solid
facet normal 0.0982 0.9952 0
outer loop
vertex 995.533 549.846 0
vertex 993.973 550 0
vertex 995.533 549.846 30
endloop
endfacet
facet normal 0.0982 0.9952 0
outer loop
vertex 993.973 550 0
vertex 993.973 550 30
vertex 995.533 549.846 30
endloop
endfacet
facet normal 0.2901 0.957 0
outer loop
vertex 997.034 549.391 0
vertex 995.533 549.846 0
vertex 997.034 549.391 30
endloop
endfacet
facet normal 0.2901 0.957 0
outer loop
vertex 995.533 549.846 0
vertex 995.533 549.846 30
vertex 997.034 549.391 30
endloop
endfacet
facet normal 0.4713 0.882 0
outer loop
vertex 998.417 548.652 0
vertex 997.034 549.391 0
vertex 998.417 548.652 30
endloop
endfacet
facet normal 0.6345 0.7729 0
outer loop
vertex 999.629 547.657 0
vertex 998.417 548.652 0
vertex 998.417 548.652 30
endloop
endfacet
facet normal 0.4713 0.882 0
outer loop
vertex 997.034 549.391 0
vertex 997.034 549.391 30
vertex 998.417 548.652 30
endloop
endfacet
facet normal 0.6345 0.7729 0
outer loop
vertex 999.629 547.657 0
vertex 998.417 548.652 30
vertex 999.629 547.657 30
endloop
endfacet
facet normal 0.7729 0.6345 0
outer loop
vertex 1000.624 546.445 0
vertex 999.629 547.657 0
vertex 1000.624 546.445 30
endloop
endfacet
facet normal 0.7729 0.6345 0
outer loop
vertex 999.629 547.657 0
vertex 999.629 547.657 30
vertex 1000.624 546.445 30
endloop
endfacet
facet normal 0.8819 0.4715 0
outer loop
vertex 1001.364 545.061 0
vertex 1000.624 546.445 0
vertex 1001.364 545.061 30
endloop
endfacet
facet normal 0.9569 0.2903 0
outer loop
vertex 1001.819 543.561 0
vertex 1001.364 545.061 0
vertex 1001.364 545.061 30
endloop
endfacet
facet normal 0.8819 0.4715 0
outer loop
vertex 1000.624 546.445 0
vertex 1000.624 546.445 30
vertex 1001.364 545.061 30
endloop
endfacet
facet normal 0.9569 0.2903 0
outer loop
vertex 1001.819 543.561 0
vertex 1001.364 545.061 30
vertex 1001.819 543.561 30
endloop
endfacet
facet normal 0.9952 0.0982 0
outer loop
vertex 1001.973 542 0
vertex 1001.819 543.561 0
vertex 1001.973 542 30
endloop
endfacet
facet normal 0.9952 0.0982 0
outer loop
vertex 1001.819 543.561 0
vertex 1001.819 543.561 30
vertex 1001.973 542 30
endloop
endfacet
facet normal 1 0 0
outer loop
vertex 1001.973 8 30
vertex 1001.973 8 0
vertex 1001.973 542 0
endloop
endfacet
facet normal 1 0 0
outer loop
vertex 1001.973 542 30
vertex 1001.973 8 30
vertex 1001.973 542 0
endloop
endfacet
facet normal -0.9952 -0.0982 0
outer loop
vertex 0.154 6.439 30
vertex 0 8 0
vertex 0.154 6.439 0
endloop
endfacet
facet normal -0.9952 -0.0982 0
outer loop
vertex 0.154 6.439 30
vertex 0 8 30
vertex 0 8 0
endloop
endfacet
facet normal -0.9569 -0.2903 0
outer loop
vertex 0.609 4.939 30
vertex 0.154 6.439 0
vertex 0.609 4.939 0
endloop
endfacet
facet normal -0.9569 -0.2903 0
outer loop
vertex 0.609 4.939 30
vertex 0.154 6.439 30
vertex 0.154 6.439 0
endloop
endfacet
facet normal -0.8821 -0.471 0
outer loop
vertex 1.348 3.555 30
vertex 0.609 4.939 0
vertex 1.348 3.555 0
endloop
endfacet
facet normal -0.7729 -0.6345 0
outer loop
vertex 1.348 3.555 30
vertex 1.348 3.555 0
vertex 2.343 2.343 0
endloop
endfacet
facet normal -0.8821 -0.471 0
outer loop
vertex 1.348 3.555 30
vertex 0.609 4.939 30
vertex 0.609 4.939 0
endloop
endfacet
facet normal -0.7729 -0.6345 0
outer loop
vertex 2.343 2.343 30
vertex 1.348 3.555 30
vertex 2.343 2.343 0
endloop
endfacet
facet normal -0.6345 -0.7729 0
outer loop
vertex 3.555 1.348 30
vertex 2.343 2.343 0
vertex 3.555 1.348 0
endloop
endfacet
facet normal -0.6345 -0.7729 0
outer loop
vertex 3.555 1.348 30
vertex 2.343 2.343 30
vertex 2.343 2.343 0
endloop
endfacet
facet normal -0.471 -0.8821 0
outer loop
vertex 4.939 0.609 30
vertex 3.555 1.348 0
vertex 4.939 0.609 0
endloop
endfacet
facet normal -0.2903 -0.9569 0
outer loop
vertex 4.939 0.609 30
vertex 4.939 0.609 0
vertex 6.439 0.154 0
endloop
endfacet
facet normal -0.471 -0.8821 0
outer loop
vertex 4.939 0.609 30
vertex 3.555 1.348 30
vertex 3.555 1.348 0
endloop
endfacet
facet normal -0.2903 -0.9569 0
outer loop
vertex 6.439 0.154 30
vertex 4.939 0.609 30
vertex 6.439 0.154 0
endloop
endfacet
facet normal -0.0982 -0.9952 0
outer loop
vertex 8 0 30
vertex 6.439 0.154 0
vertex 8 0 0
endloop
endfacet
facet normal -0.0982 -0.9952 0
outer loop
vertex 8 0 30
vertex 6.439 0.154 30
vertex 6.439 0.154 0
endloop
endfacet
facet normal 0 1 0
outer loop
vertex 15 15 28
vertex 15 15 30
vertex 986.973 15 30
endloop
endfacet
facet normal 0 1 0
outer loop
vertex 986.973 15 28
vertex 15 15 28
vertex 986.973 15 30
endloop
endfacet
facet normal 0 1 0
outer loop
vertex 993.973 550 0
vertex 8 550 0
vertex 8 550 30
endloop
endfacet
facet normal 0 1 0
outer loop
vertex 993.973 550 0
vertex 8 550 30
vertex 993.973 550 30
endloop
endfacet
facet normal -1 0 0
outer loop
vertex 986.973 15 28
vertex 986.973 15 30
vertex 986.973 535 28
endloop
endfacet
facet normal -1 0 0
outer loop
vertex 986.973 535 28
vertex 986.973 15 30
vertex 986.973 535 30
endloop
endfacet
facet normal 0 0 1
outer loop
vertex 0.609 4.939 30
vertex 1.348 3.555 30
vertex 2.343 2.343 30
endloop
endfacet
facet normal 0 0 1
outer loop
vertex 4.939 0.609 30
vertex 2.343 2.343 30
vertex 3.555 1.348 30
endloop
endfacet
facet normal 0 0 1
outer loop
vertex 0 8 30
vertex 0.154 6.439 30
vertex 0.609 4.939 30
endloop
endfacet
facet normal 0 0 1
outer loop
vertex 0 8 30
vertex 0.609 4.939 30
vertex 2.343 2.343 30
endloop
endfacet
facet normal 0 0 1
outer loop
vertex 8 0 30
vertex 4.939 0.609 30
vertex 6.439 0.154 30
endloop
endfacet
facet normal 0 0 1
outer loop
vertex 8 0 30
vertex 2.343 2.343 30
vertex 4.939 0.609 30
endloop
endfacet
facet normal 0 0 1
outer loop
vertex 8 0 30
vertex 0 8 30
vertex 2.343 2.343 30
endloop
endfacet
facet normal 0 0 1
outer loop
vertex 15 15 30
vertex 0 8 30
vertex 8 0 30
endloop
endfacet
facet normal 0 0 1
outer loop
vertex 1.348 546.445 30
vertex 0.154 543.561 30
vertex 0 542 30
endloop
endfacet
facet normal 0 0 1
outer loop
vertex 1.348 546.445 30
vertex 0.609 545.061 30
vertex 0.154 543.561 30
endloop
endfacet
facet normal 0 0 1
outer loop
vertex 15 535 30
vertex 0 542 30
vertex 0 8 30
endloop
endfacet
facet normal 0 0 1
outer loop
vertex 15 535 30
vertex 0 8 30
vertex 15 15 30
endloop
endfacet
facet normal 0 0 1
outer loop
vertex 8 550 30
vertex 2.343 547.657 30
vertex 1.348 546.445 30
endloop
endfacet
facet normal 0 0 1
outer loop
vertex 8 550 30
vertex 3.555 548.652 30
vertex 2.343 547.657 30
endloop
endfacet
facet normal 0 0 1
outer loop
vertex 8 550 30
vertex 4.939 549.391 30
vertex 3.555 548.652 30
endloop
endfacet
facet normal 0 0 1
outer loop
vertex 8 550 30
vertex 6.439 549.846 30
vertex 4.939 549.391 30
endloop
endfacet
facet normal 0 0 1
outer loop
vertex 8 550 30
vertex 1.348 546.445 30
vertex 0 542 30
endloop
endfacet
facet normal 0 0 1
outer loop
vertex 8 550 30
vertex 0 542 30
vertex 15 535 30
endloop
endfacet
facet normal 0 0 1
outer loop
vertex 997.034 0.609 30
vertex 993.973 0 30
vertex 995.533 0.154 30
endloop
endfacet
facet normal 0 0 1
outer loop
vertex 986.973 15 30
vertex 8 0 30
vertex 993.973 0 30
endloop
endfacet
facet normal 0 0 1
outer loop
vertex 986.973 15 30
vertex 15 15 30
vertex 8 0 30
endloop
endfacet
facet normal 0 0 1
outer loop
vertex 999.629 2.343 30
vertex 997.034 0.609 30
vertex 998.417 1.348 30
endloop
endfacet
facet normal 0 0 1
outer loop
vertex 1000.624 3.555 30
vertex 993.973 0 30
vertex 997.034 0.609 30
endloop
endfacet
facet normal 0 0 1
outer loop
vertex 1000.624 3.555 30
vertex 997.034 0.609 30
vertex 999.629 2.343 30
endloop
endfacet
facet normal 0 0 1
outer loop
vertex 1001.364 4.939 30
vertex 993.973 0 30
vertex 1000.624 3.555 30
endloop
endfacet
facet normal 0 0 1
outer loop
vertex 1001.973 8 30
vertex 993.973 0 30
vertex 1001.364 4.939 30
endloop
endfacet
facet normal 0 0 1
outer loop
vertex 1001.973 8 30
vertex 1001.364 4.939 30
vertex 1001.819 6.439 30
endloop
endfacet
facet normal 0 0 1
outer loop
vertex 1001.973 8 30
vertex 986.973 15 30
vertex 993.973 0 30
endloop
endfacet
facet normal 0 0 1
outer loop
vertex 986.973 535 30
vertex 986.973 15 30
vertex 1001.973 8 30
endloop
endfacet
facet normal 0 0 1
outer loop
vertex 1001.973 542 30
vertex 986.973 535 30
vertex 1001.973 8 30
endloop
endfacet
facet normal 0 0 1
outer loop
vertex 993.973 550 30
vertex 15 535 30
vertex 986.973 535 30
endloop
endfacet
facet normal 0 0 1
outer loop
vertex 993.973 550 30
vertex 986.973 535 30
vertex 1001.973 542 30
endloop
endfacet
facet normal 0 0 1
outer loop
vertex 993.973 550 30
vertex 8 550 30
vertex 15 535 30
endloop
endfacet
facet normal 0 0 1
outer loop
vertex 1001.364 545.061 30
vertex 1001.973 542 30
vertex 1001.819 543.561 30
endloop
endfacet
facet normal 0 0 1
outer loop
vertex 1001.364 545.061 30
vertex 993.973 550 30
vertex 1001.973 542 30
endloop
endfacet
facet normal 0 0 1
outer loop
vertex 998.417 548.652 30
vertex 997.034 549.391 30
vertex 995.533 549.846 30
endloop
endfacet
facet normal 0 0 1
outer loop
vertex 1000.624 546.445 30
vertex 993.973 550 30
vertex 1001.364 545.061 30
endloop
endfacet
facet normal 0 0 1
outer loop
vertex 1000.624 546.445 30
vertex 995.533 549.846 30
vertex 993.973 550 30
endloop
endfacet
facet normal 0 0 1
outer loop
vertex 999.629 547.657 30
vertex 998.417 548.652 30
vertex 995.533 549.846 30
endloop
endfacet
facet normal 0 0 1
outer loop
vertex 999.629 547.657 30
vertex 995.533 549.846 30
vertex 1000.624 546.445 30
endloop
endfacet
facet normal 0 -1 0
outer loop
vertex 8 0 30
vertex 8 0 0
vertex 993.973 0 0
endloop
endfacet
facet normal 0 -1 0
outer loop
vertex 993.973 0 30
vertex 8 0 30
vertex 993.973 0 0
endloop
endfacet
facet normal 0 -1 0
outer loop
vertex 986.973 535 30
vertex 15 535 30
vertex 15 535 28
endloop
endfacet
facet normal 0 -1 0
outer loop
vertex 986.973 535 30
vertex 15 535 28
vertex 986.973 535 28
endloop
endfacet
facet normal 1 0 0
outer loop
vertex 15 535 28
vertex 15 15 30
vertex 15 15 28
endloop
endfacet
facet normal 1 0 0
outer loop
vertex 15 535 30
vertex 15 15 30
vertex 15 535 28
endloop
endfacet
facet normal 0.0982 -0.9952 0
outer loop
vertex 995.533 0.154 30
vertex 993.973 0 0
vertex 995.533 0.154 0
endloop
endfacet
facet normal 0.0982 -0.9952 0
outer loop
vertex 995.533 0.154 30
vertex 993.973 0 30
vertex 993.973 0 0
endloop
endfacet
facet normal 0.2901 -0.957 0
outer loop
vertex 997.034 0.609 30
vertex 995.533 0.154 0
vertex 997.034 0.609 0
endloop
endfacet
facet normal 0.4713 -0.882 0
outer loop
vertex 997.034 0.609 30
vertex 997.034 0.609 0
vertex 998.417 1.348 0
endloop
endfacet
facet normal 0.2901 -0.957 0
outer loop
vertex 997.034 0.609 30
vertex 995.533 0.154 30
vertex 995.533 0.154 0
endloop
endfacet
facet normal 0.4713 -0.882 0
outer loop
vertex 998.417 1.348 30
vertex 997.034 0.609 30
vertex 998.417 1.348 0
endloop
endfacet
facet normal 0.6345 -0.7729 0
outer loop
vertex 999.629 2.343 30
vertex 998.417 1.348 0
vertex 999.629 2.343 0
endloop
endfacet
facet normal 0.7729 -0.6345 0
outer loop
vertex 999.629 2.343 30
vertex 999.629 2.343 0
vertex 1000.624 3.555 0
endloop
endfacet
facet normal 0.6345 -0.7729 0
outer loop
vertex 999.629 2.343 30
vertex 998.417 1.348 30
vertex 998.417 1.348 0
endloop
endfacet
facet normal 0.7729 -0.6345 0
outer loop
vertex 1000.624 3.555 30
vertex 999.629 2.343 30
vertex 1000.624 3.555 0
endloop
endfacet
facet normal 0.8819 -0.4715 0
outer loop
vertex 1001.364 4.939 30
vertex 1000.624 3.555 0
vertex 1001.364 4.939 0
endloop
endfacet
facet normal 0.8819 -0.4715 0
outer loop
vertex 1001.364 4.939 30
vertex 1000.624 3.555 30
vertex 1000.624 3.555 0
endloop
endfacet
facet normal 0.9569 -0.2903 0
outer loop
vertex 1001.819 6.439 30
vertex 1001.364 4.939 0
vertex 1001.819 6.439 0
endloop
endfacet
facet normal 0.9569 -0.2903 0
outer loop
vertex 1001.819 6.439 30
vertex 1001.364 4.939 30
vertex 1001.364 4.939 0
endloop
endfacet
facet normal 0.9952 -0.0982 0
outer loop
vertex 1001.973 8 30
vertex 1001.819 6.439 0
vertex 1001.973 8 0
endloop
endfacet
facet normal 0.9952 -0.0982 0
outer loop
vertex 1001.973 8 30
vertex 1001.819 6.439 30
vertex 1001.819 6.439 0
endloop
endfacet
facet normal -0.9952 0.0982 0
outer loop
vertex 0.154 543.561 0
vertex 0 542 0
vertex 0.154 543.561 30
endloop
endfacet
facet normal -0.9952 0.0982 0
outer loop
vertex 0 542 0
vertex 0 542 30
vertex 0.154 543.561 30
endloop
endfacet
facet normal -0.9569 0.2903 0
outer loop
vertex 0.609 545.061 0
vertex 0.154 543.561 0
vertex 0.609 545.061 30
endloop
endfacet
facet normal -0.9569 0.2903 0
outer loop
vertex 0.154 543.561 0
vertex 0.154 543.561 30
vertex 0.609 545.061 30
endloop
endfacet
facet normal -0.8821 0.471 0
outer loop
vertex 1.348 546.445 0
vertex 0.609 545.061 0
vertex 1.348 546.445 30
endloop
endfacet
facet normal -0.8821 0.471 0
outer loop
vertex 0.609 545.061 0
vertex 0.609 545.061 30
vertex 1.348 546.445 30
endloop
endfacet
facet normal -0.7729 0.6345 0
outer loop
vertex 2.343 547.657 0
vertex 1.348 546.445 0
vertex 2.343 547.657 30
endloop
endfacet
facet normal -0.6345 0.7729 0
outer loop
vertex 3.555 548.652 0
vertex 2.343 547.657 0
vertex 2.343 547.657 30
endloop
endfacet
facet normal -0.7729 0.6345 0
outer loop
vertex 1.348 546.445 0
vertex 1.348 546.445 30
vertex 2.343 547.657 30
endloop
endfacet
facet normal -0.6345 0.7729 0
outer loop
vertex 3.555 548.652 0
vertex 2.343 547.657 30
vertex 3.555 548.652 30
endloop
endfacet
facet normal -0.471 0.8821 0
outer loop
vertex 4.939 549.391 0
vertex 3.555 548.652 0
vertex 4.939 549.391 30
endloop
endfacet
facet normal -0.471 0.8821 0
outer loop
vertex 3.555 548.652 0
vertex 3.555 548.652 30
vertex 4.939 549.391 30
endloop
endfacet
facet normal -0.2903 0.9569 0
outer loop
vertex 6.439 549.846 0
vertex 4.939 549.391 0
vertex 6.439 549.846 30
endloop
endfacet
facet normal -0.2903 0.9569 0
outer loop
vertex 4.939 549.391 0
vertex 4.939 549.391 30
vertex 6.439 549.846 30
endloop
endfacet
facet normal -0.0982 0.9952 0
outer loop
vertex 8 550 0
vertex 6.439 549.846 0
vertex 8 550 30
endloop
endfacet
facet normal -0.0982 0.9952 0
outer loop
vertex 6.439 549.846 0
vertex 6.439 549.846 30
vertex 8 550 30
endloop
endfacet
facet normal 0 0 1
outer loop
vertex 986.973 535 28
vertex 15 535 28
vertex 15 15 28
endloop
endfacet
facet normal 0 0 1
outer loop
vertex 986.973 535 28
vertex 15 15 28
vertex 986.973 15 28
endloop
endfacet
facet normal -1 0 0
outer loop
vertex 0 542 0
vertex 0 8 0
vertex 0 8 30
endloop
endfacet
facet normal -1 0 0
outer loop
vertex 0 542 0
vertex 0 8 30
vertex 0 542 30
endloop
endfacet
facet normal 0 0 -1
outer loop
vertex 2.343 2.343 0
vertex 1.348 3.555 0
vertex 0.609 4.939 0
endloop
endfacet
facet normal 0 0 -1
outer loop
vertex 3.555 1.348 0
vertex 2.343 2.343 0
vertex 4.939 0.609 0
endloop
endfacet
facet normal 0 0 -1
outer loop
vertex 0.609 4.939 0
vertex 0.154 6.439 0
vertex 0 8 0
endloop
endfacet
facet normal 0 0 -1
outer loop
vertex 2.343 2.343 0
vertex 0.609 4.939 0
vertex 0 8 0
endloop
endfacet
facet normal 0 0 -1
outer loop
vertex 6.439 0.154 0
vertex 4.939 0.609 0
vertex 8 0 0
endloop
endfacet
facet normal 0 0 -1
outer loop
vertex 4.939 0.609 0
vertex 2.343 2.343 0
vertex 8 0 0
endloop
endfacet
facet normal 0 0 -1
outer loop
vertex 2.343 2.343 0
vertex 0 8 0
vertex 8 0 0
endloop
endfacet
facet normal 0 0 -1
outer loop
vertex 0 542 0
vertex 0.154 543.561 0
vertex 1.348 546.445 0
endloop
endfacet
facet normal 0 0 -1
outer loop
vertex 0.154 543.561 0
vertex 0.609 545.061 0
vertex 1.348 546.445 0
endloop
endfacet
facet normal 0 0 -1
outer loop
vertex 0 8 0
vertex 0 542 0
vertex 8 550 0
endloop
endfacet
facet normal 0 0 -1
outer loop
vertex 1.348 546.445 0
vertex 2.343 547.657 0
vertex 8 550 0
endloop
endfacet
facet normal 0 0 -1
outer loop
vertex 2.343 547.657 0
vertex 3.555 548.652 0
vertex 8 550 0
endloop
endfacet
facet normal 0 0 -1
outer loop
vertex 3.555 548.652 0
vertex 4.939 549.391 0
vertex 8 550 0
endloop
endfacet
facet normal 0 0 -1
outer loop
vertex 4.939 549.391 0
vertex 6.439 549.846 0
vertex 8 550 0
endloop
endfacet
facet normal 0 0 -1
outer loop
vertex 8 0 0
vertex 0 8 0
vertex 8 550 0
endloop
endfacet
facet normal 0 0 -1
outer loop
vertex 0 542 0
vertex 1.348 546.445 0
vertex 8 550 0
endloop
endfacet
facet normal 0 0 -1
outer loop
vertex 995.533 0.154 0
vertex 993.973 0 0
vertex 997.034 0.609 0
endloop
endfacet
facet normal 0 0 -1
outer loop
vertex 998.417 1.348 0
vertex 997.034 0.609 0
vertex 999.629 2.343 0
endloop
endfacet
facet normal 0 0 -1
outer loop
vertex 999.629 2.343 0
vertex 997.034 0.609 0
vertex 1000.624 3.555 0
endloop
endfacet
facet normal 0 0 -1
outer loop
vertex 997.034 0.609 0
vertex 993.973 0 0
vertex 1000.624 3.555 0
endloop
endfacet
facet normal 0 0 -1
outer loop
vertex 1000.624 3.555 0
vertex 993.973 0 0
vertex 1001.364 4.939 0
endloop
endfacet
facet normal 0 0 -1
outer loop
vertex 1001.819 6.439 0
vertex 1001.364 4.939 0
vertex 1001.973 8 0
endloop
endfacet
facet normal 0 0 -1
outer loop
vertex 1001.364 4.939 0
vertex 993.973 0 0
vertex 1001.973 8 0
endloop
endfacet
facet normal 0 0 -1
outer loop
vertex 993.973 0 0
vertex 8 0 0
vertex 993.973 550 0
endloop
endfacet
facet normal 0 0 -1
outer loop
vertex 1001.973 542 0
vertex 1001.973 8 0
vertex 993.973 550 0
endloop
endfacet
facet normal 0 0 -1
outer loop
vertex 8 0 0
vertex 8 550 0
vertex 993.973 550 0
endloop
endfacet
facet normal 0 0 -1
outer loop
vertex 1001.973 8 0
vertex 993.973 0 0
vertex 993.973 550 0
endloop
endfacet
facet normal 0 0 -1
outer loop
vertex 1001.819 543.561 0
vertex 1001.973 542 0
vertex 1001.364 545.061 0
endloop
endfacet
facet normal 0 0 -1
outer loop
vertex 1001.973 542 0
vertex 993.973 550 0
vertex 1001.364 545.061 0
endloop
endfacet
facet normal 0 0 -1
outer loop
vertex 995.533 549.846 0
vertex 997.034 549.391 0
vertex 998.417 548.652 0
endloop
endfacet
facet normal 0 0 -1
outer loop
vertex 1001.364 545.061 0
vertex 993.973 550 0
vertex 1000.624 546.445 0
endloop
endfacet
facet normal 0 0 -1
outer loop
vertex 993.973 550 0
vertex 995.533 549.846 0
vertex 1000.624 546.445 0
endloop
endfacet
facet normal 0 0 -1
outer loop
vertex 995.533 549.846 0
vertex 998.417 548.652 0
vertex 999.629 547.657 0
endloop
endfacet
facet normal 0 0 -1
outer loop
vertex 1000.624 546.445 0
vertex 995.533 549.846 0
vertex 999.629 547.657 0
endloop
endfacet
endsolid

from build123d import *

# Parameters (mm, degrees)
CROQUIS1_W              = 1001.972554514
CROQUIS1_H              = 550
SALIENTE_EXTRUIR1_DEPTH = 30
CROQUIS2_W              = 971.972554514
CROQUIS2_H              = 520
CORTAR_EXTRUIR1_DEPTH   = 2
REDONDEO1_R             = 8


with BuildPart() as part:
    # Croquis1 → Saliente-Extruir1 (new body)
    with BuildSketch(Plane.XY):
        with Locations((500.986277257, 275)):
            Rectangle(CROQUIS1_W, CROQUIS1_H)
    extrude(amount=SALIENTE_EXTRUIR1_DEPTH)

    # Croquis2 → Cortar-Extruir1 (cut)
    with BuildSketch(Plane.XY.offset(30)):
        with Locations((500.986277257, 275)):
            Rectangle(CROQUIS2_W, CROQUIS2_H)
    extrude(amount=-CORTAR_EXTRUIR1_DEPTH, mode=Mode.SUBTRACT)

    # Redondeo1
    redondeo1_edges = [part.edges().sort_by_distance(p)[0] for p in [
        (0, 550, 15),
        (1001.972554514, 550, 15),
        (1001.972554514, 0, 15),
        (0, 0, 15),
    ]]
    fillet(redondeo1_edges, radius=REDONDEO1_R)


solid = part.part
